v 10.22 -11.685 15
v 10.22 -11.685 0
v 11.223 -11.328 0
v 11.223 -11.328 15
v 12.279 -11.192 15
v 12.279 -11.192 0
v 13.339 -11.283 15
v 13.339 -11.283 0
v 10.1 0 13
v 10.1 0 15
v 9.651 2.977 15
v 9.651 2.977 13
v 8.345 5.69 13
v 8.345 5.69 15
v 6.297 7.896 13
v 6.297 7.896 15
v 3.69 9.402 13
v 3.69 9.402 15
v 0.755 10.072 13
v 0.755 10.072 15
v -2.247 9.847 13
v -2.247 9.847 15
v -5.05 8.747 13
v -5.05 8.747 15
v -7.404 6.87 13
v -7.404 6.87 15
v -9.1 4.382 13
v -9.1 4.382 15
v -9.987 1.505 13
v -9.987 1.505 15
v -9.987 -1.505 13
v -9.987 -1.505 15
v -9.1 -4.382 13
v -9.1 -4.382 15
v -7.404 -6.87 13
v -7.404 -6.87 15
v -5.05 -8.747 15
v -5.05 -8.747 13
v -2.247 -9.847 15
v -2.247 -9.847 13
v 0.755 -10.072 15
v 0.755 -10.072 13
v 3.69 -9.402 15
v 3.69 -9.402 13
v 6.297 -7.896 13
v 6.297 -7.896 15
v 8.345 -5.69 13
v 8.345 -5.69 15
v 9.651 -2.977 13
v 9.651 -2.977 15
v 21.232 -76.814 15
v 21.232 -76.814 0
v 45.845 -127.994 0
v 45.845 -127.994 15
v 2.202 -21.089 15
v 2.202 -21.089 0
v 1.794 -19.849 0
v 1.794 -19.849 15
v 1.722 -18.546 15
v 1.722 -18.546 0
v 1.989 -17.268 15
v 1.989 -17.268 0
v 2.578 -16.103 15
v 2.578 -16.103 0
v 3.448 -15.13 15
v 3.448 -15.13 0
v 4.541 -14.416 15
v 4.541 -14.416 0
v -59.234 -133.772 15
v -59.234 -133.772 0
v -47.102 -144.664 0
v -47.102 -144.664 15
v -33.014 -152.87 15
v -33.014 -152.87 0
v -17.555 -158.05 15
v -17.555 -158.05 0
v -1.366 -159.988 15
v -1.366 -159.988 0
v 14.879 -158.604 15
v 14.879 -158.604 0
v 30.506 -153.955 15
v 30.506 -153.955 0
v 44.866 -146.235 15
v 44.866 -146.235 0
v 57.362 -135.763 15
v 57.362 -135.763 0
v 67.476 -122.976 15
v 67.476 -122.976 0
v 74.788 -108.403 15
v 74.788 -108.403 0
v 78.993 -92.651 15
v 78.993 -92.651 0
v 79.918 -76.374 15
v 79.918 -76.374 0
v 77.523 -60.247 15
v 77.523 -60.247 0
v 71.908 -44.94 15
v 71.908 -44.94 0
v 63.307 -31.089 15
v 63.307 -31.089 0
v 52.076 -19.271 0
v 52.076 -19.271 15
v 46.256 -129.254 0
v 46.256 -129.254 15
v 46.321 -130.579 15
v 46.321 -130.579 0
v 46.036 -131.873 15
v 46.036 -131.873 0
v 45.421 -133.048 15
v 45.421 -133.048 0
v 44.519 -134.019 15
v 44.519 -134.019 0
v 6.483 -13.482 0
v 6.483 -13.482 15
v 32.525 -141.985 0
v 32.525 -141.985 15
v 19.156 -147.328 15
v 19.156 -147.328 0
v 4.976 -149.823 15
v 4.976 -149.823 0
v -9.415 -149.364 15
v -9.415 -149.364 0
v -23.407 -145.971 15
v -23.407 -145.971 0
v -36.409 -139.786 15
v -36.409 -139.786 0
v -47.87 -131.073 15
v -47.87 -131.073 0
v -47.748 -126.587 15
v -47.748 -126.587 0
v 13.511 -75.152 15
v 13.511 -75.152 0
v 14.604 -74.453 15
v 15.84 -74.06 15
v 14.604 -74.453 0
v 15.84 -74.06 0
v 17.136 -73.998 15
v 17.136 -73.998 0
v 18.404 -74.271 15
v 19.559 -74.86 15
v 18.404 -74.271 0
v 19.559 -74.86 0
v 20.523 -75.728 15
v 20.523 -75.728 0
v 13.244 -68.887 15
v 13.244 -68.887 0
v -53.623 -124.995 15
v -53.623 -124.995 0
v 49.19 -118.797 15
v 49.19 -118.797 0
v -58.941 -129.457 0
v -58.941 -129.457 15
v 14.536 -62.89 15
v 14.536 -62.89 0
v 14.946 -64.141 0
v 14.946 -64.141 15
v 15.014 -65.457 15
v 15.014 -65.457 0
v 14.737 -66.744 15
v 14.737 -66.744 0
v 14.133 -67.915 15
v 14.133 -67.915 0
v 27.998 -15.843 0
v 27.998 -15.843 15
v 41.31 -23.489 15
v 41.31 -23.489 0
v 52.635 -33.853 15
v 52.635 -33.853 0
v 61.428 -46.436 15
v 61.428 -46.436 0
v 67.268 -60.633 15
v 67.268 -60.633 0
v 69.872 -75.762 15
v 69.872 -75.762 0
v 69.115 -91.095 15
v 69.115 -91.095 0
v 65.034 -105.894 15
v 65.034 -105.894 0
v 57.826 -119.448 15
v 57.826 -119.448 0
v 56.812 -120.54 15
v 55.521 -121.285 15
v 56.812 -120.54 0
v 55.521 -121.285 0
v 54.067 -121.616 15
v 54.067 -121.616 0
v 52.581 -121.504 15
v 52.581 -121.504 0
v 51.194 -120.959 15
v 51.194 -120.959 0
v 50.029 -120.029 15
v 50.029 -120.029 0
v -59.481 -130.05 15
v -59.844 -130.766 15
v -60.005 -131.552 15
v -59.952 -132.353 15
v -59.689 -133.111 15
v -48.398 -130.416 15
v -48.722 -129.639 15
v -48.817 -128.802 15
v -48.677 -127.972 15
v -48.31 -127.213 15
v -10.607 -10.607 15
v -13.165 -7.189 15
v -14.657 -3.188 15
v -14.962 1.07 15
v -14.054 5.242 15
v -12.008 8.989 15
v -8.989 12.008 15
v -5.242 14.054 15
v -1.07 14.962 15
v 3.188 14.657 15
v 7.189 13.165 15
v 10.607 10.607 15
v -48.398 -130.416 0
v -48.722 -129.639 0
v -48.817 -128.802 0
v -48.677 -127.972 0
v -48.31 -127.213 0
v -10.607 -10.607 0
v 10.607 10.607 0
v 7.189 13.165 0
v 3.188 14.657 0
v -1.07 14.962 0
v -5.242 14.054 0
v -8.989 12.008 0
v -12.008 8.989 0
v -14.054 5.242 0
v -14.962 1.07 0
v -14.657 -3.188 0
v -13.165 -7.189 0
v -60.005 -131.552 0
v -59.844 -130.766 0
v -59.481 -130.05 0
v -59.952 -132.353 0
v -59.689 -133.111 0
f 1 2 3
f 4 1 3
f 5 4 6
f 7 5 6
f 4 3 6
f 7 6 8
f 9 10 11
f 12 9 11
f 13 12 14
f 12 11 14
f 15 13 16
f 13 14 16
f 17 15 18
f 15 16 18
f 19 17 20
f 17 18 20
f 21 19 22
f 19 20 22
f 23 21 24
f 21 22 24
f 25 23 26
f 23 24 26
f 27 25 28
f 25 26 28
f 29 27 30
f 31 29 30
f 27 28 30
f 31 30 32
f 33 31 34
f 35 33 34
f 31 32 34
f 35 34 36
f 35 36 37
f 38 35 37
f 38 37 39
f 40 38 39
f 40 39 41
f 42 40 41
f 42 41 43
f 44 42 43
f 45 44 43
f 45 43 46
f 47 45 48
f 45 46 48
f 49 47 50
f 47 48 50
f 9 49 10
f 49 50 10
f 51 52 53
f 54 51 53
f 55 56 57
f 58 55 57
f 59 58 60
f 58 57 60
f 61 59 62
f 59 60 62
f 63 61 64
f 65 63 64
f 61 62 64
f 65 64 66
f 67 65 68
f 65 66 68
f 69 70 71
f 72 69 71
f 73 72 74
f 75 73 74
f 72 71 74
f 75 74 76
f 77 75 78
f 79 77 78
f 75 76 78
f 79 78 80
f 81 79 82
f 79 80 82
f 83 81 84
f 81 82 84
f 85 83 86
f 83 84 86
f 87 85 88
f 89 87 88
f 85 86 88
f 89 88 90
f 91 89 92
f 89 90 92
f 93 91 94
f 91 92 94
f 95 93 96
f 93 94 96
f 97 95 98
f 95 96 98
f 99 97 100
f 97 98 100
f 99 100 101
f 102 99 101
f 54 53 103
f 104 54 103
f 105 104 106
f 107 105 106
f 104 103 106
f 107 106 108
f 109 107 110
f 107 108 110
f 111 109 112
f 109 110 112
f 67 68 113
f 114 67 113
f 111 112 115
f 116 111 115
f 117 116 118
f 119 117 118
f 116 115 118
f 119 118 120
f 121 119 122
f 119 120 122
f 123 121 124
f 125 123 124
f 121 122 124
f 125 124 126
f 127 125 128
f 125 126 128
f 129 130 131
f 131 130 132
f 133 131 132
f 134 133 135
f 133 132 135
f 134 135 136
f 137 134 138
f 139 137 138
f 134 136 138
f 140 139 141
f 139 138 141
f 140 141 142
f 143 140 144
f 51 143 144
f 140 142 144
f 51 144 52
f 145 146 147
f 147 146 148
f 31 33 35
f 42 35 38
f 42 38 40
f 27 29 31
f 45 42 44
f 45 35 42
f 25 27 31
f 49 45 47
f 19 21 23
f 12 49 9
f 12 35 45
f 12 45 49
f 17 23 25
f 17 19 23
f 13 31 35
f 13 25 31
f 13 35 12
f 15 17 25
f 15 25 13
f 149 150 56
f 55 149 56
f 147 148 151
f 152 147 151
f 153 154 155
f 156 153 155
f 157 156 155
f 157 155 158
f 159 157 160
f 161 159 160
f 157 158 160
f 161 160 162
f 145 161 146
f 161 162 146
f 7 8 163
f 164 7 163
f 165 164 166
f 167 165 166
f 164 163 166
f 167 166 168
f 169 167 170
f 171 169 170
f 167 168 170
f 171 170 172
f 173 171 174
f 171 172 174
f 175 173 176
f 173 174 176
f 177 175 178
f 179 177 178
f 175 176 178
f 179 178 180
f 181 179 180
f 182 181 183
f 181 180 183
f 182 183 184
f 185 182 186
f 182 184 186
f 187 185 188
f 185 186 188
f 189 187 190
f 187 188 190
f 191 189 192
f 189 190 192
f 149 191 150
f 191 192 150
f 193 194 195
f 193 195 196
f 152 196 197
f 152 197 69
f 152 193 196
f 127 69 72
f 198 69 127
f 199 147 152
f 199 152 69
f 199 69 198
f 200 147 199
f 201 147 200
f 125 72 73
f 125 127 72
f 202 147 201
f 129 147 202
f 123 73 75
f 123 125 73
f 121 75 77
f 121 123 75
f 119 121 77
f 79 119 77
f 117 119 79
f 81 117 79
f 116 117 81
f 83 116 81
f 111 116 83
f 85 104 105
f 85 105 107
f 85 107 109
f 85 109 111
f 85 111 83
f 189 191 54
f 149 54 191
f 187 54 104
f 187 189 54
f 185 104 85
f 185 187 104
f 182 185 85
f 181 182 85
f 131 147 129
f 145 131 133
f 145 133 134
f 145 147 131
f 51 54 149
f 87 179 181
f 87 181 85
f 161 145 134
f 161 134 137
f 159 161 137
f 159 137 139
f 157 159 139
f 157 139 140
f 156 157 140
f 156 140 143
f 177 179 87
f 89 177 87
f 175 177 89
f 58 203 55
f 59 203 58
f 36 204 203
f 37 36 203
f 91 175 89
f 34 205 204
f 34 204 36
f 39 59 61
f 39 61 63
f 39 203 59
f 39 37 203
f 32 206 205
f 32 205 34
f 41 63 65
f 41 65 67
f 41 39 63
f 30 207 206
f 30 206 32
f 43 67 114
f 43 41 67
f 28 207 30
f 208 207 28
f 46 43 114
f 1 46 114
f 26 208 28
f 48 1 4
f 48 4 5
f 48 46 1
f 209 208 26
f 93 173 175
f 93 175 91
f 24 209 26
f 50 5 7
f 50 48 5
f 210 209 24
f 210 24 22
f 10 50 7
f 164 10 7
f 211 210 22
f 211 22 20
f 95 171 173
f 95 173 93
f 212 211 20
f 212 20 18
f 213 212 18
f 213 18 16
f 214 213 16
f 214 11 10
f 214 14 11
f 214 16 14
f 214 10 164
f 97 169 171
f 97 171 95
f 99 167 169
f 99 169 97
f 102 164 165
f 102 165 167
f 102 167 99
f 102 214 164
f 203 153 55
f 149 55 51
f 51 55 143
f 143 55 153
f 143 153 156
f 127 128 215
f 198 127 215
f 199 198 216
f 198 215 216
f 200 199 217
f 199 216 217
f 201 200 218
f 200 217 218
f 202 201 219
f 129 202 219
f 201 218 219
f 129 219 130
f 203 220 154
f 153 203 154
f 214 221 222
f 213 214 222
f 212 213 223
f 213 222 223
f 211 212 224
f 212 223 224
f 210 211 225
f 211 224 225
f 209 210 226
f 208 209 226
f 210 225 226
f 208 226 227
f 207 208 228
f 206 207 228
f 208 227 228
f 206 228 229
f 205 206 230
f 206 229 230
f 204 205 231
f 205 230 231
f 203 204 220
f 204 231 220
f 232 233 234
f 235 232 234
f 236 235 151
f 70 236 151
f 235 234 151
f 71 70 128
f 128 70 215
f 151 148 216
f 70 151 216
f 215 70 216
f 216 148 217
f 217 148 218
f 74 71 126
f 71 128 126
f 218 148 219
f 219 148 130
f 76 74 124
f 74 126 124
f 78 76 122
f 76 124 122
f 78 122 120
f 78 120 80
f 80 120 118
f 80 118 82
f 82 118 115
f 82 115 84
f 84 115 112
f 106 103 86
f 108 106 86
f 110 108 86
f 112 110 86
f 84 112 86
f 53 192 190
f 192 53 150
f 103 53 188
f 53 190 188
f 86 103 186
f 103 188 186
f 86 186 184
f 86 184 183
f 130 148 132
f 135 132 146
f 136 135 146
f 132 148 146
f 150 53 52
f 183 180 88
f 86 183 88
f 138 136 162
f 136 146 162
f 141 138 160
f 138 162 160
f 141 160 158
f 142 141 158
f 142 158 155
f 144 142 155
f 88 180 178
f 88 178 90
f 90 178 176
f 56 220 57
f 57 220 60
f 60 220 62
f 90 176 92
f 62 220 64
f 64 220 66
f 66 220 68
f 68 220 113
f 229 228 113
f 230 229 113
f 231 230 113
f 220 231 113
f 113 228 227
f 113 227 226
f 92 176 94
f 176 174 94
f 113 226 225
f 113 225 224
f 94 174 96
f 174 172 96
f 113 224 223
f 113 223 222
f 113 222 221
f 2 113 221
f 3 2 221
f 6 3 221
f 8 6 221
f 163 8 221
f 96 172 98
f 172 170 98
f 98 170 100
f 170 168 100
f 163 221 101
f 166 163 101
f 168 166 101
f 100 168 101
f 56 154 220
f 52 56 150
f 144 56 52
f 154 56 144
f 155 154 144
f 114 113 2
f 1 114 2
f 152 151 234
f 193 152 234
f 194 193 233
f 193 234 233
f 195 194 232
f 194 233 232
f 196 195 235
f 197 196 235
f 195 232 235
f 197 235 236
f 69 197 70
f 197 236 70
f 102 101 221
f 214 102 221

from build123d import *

# Parameters (mm, degrees)
EXTRUDE_1_DEPTH     = 15
CUT_EXTRUDE_START   = -15
CUT_EXTRUDE_1_DEPTH = 15
SKETCH_7_R          = 10.1
CUT_EXTRUDE_2_DEPTH = 2


with BuildPart() as part:
    # ｽｹｯﾁ4 → ﾎﾞｽ - 押し出し1 (new body)
    with BuildSketch(Plane.XY):
        with BuildLine():
            Line((-53.623111018, -124.995132678), (-58.940636287, -129.45706617))
            ThreePointArc((-58.940636287, -129.45706617), (-60.005384698, -131.552012131), (-59.233530865, -133.771635843))
            ThreePointArc((-59.233530865, -133.771635843), (57.362306223, -135.763481103), (52.076178918, -19.270504783))
            Line((52.076178918, -19.270504783), (10.606601718, 10.606601718))
            ThreePointArc((10.606601718, 10.606601718), (-10.606601718, 10.606601718), (-10.606601718, -10.606601718))
            Line((-10.606601718, -10.606601718), (14.536280154, -62.889638219))
            ThreePointArc((14.536280154, -62.889638219), (14.918089499, -66.109676181), (13.244185189, -68.886809092))
            Line((13.244185189, -68.886809092), (-53.623111018, -124.995132678))
        make_face()
        with BuildLine():
            Line((21.232400696, -76.813798404), (45.844843506, -127.993820346))
            ThreePointArc((45.844843506, -127.993820346), (46.221944165, -131.235480845), (44.518718993, -134.019289696))
            ThreePointArc((44.518718993, -134.019289696), (-2.231208213, -149.964431749), (-47.870174388, -131.072951785))
            ThreePointArc((-47.870174388, -131.072951785), (-48.817477846, -128.802229421), (-47.747678417, -126.586582094))
            Line((-47.747678417, -126.586582094), (13.511229465, -75.151532228))
            ThreePointArc((13.511229465, -75.151532228), (17.77869109, -74.092739753), (21.232400696, -76.813798404))
        make_face(mode=Mode.SUBTRACT)
    extrude(amount=EXTRUDE_1_DEPTH)

    # ｽｹｯﾁ6 → ｶｯﾄ - 押し出し1 (cut)
    with BuildSketch(Plane.XY.offset(15).offset(CUT_EXTRUDE_START)):
        with BuildLine():
            Line((49.189589797, -118.797265215), (2.201751786, -21.089020696))
            ThreePointArc((2.201751786, -21.089020696), (1.989274209, -17.268089629), (4.540836142, -14.416039025))
            Line((4.540836142, -14.416039025), (6.483415605, -13.48185369))
            Line((6.483415605, -13.48185369), (10.219658847, -11.685096486))
            ThreePointArc((10.219658847, -11.685096486), (11.747077013, -11.232198087), (13.339423466, -11.282754846))
            ThreePointArc((13.339423466, -11.282754846), (64.738421392, -53.37413296), (57.826055334, -119.448033215))
            ThreePointArc((57.826055334, -119.448033215), (53.319931874, -121.616182211), (49.189589797, -118.797265215))
        make_face()
    extrude(amount=CUT_EXTRUDE_1_DEPTH, mode=Mode.SUBTRACT)

    # ｽｹｯﾁ7 → ｶｯﾄ - 押し出し2 (cut)
    with BuildSketch(Plane.XY.offset(15)):
        Circle(SKETCH_7_R)
    extrude(amount=-CUT_EXTRUDE_2_DEPTH, mode=Mode.SUBTRACT)


solid = part.part
